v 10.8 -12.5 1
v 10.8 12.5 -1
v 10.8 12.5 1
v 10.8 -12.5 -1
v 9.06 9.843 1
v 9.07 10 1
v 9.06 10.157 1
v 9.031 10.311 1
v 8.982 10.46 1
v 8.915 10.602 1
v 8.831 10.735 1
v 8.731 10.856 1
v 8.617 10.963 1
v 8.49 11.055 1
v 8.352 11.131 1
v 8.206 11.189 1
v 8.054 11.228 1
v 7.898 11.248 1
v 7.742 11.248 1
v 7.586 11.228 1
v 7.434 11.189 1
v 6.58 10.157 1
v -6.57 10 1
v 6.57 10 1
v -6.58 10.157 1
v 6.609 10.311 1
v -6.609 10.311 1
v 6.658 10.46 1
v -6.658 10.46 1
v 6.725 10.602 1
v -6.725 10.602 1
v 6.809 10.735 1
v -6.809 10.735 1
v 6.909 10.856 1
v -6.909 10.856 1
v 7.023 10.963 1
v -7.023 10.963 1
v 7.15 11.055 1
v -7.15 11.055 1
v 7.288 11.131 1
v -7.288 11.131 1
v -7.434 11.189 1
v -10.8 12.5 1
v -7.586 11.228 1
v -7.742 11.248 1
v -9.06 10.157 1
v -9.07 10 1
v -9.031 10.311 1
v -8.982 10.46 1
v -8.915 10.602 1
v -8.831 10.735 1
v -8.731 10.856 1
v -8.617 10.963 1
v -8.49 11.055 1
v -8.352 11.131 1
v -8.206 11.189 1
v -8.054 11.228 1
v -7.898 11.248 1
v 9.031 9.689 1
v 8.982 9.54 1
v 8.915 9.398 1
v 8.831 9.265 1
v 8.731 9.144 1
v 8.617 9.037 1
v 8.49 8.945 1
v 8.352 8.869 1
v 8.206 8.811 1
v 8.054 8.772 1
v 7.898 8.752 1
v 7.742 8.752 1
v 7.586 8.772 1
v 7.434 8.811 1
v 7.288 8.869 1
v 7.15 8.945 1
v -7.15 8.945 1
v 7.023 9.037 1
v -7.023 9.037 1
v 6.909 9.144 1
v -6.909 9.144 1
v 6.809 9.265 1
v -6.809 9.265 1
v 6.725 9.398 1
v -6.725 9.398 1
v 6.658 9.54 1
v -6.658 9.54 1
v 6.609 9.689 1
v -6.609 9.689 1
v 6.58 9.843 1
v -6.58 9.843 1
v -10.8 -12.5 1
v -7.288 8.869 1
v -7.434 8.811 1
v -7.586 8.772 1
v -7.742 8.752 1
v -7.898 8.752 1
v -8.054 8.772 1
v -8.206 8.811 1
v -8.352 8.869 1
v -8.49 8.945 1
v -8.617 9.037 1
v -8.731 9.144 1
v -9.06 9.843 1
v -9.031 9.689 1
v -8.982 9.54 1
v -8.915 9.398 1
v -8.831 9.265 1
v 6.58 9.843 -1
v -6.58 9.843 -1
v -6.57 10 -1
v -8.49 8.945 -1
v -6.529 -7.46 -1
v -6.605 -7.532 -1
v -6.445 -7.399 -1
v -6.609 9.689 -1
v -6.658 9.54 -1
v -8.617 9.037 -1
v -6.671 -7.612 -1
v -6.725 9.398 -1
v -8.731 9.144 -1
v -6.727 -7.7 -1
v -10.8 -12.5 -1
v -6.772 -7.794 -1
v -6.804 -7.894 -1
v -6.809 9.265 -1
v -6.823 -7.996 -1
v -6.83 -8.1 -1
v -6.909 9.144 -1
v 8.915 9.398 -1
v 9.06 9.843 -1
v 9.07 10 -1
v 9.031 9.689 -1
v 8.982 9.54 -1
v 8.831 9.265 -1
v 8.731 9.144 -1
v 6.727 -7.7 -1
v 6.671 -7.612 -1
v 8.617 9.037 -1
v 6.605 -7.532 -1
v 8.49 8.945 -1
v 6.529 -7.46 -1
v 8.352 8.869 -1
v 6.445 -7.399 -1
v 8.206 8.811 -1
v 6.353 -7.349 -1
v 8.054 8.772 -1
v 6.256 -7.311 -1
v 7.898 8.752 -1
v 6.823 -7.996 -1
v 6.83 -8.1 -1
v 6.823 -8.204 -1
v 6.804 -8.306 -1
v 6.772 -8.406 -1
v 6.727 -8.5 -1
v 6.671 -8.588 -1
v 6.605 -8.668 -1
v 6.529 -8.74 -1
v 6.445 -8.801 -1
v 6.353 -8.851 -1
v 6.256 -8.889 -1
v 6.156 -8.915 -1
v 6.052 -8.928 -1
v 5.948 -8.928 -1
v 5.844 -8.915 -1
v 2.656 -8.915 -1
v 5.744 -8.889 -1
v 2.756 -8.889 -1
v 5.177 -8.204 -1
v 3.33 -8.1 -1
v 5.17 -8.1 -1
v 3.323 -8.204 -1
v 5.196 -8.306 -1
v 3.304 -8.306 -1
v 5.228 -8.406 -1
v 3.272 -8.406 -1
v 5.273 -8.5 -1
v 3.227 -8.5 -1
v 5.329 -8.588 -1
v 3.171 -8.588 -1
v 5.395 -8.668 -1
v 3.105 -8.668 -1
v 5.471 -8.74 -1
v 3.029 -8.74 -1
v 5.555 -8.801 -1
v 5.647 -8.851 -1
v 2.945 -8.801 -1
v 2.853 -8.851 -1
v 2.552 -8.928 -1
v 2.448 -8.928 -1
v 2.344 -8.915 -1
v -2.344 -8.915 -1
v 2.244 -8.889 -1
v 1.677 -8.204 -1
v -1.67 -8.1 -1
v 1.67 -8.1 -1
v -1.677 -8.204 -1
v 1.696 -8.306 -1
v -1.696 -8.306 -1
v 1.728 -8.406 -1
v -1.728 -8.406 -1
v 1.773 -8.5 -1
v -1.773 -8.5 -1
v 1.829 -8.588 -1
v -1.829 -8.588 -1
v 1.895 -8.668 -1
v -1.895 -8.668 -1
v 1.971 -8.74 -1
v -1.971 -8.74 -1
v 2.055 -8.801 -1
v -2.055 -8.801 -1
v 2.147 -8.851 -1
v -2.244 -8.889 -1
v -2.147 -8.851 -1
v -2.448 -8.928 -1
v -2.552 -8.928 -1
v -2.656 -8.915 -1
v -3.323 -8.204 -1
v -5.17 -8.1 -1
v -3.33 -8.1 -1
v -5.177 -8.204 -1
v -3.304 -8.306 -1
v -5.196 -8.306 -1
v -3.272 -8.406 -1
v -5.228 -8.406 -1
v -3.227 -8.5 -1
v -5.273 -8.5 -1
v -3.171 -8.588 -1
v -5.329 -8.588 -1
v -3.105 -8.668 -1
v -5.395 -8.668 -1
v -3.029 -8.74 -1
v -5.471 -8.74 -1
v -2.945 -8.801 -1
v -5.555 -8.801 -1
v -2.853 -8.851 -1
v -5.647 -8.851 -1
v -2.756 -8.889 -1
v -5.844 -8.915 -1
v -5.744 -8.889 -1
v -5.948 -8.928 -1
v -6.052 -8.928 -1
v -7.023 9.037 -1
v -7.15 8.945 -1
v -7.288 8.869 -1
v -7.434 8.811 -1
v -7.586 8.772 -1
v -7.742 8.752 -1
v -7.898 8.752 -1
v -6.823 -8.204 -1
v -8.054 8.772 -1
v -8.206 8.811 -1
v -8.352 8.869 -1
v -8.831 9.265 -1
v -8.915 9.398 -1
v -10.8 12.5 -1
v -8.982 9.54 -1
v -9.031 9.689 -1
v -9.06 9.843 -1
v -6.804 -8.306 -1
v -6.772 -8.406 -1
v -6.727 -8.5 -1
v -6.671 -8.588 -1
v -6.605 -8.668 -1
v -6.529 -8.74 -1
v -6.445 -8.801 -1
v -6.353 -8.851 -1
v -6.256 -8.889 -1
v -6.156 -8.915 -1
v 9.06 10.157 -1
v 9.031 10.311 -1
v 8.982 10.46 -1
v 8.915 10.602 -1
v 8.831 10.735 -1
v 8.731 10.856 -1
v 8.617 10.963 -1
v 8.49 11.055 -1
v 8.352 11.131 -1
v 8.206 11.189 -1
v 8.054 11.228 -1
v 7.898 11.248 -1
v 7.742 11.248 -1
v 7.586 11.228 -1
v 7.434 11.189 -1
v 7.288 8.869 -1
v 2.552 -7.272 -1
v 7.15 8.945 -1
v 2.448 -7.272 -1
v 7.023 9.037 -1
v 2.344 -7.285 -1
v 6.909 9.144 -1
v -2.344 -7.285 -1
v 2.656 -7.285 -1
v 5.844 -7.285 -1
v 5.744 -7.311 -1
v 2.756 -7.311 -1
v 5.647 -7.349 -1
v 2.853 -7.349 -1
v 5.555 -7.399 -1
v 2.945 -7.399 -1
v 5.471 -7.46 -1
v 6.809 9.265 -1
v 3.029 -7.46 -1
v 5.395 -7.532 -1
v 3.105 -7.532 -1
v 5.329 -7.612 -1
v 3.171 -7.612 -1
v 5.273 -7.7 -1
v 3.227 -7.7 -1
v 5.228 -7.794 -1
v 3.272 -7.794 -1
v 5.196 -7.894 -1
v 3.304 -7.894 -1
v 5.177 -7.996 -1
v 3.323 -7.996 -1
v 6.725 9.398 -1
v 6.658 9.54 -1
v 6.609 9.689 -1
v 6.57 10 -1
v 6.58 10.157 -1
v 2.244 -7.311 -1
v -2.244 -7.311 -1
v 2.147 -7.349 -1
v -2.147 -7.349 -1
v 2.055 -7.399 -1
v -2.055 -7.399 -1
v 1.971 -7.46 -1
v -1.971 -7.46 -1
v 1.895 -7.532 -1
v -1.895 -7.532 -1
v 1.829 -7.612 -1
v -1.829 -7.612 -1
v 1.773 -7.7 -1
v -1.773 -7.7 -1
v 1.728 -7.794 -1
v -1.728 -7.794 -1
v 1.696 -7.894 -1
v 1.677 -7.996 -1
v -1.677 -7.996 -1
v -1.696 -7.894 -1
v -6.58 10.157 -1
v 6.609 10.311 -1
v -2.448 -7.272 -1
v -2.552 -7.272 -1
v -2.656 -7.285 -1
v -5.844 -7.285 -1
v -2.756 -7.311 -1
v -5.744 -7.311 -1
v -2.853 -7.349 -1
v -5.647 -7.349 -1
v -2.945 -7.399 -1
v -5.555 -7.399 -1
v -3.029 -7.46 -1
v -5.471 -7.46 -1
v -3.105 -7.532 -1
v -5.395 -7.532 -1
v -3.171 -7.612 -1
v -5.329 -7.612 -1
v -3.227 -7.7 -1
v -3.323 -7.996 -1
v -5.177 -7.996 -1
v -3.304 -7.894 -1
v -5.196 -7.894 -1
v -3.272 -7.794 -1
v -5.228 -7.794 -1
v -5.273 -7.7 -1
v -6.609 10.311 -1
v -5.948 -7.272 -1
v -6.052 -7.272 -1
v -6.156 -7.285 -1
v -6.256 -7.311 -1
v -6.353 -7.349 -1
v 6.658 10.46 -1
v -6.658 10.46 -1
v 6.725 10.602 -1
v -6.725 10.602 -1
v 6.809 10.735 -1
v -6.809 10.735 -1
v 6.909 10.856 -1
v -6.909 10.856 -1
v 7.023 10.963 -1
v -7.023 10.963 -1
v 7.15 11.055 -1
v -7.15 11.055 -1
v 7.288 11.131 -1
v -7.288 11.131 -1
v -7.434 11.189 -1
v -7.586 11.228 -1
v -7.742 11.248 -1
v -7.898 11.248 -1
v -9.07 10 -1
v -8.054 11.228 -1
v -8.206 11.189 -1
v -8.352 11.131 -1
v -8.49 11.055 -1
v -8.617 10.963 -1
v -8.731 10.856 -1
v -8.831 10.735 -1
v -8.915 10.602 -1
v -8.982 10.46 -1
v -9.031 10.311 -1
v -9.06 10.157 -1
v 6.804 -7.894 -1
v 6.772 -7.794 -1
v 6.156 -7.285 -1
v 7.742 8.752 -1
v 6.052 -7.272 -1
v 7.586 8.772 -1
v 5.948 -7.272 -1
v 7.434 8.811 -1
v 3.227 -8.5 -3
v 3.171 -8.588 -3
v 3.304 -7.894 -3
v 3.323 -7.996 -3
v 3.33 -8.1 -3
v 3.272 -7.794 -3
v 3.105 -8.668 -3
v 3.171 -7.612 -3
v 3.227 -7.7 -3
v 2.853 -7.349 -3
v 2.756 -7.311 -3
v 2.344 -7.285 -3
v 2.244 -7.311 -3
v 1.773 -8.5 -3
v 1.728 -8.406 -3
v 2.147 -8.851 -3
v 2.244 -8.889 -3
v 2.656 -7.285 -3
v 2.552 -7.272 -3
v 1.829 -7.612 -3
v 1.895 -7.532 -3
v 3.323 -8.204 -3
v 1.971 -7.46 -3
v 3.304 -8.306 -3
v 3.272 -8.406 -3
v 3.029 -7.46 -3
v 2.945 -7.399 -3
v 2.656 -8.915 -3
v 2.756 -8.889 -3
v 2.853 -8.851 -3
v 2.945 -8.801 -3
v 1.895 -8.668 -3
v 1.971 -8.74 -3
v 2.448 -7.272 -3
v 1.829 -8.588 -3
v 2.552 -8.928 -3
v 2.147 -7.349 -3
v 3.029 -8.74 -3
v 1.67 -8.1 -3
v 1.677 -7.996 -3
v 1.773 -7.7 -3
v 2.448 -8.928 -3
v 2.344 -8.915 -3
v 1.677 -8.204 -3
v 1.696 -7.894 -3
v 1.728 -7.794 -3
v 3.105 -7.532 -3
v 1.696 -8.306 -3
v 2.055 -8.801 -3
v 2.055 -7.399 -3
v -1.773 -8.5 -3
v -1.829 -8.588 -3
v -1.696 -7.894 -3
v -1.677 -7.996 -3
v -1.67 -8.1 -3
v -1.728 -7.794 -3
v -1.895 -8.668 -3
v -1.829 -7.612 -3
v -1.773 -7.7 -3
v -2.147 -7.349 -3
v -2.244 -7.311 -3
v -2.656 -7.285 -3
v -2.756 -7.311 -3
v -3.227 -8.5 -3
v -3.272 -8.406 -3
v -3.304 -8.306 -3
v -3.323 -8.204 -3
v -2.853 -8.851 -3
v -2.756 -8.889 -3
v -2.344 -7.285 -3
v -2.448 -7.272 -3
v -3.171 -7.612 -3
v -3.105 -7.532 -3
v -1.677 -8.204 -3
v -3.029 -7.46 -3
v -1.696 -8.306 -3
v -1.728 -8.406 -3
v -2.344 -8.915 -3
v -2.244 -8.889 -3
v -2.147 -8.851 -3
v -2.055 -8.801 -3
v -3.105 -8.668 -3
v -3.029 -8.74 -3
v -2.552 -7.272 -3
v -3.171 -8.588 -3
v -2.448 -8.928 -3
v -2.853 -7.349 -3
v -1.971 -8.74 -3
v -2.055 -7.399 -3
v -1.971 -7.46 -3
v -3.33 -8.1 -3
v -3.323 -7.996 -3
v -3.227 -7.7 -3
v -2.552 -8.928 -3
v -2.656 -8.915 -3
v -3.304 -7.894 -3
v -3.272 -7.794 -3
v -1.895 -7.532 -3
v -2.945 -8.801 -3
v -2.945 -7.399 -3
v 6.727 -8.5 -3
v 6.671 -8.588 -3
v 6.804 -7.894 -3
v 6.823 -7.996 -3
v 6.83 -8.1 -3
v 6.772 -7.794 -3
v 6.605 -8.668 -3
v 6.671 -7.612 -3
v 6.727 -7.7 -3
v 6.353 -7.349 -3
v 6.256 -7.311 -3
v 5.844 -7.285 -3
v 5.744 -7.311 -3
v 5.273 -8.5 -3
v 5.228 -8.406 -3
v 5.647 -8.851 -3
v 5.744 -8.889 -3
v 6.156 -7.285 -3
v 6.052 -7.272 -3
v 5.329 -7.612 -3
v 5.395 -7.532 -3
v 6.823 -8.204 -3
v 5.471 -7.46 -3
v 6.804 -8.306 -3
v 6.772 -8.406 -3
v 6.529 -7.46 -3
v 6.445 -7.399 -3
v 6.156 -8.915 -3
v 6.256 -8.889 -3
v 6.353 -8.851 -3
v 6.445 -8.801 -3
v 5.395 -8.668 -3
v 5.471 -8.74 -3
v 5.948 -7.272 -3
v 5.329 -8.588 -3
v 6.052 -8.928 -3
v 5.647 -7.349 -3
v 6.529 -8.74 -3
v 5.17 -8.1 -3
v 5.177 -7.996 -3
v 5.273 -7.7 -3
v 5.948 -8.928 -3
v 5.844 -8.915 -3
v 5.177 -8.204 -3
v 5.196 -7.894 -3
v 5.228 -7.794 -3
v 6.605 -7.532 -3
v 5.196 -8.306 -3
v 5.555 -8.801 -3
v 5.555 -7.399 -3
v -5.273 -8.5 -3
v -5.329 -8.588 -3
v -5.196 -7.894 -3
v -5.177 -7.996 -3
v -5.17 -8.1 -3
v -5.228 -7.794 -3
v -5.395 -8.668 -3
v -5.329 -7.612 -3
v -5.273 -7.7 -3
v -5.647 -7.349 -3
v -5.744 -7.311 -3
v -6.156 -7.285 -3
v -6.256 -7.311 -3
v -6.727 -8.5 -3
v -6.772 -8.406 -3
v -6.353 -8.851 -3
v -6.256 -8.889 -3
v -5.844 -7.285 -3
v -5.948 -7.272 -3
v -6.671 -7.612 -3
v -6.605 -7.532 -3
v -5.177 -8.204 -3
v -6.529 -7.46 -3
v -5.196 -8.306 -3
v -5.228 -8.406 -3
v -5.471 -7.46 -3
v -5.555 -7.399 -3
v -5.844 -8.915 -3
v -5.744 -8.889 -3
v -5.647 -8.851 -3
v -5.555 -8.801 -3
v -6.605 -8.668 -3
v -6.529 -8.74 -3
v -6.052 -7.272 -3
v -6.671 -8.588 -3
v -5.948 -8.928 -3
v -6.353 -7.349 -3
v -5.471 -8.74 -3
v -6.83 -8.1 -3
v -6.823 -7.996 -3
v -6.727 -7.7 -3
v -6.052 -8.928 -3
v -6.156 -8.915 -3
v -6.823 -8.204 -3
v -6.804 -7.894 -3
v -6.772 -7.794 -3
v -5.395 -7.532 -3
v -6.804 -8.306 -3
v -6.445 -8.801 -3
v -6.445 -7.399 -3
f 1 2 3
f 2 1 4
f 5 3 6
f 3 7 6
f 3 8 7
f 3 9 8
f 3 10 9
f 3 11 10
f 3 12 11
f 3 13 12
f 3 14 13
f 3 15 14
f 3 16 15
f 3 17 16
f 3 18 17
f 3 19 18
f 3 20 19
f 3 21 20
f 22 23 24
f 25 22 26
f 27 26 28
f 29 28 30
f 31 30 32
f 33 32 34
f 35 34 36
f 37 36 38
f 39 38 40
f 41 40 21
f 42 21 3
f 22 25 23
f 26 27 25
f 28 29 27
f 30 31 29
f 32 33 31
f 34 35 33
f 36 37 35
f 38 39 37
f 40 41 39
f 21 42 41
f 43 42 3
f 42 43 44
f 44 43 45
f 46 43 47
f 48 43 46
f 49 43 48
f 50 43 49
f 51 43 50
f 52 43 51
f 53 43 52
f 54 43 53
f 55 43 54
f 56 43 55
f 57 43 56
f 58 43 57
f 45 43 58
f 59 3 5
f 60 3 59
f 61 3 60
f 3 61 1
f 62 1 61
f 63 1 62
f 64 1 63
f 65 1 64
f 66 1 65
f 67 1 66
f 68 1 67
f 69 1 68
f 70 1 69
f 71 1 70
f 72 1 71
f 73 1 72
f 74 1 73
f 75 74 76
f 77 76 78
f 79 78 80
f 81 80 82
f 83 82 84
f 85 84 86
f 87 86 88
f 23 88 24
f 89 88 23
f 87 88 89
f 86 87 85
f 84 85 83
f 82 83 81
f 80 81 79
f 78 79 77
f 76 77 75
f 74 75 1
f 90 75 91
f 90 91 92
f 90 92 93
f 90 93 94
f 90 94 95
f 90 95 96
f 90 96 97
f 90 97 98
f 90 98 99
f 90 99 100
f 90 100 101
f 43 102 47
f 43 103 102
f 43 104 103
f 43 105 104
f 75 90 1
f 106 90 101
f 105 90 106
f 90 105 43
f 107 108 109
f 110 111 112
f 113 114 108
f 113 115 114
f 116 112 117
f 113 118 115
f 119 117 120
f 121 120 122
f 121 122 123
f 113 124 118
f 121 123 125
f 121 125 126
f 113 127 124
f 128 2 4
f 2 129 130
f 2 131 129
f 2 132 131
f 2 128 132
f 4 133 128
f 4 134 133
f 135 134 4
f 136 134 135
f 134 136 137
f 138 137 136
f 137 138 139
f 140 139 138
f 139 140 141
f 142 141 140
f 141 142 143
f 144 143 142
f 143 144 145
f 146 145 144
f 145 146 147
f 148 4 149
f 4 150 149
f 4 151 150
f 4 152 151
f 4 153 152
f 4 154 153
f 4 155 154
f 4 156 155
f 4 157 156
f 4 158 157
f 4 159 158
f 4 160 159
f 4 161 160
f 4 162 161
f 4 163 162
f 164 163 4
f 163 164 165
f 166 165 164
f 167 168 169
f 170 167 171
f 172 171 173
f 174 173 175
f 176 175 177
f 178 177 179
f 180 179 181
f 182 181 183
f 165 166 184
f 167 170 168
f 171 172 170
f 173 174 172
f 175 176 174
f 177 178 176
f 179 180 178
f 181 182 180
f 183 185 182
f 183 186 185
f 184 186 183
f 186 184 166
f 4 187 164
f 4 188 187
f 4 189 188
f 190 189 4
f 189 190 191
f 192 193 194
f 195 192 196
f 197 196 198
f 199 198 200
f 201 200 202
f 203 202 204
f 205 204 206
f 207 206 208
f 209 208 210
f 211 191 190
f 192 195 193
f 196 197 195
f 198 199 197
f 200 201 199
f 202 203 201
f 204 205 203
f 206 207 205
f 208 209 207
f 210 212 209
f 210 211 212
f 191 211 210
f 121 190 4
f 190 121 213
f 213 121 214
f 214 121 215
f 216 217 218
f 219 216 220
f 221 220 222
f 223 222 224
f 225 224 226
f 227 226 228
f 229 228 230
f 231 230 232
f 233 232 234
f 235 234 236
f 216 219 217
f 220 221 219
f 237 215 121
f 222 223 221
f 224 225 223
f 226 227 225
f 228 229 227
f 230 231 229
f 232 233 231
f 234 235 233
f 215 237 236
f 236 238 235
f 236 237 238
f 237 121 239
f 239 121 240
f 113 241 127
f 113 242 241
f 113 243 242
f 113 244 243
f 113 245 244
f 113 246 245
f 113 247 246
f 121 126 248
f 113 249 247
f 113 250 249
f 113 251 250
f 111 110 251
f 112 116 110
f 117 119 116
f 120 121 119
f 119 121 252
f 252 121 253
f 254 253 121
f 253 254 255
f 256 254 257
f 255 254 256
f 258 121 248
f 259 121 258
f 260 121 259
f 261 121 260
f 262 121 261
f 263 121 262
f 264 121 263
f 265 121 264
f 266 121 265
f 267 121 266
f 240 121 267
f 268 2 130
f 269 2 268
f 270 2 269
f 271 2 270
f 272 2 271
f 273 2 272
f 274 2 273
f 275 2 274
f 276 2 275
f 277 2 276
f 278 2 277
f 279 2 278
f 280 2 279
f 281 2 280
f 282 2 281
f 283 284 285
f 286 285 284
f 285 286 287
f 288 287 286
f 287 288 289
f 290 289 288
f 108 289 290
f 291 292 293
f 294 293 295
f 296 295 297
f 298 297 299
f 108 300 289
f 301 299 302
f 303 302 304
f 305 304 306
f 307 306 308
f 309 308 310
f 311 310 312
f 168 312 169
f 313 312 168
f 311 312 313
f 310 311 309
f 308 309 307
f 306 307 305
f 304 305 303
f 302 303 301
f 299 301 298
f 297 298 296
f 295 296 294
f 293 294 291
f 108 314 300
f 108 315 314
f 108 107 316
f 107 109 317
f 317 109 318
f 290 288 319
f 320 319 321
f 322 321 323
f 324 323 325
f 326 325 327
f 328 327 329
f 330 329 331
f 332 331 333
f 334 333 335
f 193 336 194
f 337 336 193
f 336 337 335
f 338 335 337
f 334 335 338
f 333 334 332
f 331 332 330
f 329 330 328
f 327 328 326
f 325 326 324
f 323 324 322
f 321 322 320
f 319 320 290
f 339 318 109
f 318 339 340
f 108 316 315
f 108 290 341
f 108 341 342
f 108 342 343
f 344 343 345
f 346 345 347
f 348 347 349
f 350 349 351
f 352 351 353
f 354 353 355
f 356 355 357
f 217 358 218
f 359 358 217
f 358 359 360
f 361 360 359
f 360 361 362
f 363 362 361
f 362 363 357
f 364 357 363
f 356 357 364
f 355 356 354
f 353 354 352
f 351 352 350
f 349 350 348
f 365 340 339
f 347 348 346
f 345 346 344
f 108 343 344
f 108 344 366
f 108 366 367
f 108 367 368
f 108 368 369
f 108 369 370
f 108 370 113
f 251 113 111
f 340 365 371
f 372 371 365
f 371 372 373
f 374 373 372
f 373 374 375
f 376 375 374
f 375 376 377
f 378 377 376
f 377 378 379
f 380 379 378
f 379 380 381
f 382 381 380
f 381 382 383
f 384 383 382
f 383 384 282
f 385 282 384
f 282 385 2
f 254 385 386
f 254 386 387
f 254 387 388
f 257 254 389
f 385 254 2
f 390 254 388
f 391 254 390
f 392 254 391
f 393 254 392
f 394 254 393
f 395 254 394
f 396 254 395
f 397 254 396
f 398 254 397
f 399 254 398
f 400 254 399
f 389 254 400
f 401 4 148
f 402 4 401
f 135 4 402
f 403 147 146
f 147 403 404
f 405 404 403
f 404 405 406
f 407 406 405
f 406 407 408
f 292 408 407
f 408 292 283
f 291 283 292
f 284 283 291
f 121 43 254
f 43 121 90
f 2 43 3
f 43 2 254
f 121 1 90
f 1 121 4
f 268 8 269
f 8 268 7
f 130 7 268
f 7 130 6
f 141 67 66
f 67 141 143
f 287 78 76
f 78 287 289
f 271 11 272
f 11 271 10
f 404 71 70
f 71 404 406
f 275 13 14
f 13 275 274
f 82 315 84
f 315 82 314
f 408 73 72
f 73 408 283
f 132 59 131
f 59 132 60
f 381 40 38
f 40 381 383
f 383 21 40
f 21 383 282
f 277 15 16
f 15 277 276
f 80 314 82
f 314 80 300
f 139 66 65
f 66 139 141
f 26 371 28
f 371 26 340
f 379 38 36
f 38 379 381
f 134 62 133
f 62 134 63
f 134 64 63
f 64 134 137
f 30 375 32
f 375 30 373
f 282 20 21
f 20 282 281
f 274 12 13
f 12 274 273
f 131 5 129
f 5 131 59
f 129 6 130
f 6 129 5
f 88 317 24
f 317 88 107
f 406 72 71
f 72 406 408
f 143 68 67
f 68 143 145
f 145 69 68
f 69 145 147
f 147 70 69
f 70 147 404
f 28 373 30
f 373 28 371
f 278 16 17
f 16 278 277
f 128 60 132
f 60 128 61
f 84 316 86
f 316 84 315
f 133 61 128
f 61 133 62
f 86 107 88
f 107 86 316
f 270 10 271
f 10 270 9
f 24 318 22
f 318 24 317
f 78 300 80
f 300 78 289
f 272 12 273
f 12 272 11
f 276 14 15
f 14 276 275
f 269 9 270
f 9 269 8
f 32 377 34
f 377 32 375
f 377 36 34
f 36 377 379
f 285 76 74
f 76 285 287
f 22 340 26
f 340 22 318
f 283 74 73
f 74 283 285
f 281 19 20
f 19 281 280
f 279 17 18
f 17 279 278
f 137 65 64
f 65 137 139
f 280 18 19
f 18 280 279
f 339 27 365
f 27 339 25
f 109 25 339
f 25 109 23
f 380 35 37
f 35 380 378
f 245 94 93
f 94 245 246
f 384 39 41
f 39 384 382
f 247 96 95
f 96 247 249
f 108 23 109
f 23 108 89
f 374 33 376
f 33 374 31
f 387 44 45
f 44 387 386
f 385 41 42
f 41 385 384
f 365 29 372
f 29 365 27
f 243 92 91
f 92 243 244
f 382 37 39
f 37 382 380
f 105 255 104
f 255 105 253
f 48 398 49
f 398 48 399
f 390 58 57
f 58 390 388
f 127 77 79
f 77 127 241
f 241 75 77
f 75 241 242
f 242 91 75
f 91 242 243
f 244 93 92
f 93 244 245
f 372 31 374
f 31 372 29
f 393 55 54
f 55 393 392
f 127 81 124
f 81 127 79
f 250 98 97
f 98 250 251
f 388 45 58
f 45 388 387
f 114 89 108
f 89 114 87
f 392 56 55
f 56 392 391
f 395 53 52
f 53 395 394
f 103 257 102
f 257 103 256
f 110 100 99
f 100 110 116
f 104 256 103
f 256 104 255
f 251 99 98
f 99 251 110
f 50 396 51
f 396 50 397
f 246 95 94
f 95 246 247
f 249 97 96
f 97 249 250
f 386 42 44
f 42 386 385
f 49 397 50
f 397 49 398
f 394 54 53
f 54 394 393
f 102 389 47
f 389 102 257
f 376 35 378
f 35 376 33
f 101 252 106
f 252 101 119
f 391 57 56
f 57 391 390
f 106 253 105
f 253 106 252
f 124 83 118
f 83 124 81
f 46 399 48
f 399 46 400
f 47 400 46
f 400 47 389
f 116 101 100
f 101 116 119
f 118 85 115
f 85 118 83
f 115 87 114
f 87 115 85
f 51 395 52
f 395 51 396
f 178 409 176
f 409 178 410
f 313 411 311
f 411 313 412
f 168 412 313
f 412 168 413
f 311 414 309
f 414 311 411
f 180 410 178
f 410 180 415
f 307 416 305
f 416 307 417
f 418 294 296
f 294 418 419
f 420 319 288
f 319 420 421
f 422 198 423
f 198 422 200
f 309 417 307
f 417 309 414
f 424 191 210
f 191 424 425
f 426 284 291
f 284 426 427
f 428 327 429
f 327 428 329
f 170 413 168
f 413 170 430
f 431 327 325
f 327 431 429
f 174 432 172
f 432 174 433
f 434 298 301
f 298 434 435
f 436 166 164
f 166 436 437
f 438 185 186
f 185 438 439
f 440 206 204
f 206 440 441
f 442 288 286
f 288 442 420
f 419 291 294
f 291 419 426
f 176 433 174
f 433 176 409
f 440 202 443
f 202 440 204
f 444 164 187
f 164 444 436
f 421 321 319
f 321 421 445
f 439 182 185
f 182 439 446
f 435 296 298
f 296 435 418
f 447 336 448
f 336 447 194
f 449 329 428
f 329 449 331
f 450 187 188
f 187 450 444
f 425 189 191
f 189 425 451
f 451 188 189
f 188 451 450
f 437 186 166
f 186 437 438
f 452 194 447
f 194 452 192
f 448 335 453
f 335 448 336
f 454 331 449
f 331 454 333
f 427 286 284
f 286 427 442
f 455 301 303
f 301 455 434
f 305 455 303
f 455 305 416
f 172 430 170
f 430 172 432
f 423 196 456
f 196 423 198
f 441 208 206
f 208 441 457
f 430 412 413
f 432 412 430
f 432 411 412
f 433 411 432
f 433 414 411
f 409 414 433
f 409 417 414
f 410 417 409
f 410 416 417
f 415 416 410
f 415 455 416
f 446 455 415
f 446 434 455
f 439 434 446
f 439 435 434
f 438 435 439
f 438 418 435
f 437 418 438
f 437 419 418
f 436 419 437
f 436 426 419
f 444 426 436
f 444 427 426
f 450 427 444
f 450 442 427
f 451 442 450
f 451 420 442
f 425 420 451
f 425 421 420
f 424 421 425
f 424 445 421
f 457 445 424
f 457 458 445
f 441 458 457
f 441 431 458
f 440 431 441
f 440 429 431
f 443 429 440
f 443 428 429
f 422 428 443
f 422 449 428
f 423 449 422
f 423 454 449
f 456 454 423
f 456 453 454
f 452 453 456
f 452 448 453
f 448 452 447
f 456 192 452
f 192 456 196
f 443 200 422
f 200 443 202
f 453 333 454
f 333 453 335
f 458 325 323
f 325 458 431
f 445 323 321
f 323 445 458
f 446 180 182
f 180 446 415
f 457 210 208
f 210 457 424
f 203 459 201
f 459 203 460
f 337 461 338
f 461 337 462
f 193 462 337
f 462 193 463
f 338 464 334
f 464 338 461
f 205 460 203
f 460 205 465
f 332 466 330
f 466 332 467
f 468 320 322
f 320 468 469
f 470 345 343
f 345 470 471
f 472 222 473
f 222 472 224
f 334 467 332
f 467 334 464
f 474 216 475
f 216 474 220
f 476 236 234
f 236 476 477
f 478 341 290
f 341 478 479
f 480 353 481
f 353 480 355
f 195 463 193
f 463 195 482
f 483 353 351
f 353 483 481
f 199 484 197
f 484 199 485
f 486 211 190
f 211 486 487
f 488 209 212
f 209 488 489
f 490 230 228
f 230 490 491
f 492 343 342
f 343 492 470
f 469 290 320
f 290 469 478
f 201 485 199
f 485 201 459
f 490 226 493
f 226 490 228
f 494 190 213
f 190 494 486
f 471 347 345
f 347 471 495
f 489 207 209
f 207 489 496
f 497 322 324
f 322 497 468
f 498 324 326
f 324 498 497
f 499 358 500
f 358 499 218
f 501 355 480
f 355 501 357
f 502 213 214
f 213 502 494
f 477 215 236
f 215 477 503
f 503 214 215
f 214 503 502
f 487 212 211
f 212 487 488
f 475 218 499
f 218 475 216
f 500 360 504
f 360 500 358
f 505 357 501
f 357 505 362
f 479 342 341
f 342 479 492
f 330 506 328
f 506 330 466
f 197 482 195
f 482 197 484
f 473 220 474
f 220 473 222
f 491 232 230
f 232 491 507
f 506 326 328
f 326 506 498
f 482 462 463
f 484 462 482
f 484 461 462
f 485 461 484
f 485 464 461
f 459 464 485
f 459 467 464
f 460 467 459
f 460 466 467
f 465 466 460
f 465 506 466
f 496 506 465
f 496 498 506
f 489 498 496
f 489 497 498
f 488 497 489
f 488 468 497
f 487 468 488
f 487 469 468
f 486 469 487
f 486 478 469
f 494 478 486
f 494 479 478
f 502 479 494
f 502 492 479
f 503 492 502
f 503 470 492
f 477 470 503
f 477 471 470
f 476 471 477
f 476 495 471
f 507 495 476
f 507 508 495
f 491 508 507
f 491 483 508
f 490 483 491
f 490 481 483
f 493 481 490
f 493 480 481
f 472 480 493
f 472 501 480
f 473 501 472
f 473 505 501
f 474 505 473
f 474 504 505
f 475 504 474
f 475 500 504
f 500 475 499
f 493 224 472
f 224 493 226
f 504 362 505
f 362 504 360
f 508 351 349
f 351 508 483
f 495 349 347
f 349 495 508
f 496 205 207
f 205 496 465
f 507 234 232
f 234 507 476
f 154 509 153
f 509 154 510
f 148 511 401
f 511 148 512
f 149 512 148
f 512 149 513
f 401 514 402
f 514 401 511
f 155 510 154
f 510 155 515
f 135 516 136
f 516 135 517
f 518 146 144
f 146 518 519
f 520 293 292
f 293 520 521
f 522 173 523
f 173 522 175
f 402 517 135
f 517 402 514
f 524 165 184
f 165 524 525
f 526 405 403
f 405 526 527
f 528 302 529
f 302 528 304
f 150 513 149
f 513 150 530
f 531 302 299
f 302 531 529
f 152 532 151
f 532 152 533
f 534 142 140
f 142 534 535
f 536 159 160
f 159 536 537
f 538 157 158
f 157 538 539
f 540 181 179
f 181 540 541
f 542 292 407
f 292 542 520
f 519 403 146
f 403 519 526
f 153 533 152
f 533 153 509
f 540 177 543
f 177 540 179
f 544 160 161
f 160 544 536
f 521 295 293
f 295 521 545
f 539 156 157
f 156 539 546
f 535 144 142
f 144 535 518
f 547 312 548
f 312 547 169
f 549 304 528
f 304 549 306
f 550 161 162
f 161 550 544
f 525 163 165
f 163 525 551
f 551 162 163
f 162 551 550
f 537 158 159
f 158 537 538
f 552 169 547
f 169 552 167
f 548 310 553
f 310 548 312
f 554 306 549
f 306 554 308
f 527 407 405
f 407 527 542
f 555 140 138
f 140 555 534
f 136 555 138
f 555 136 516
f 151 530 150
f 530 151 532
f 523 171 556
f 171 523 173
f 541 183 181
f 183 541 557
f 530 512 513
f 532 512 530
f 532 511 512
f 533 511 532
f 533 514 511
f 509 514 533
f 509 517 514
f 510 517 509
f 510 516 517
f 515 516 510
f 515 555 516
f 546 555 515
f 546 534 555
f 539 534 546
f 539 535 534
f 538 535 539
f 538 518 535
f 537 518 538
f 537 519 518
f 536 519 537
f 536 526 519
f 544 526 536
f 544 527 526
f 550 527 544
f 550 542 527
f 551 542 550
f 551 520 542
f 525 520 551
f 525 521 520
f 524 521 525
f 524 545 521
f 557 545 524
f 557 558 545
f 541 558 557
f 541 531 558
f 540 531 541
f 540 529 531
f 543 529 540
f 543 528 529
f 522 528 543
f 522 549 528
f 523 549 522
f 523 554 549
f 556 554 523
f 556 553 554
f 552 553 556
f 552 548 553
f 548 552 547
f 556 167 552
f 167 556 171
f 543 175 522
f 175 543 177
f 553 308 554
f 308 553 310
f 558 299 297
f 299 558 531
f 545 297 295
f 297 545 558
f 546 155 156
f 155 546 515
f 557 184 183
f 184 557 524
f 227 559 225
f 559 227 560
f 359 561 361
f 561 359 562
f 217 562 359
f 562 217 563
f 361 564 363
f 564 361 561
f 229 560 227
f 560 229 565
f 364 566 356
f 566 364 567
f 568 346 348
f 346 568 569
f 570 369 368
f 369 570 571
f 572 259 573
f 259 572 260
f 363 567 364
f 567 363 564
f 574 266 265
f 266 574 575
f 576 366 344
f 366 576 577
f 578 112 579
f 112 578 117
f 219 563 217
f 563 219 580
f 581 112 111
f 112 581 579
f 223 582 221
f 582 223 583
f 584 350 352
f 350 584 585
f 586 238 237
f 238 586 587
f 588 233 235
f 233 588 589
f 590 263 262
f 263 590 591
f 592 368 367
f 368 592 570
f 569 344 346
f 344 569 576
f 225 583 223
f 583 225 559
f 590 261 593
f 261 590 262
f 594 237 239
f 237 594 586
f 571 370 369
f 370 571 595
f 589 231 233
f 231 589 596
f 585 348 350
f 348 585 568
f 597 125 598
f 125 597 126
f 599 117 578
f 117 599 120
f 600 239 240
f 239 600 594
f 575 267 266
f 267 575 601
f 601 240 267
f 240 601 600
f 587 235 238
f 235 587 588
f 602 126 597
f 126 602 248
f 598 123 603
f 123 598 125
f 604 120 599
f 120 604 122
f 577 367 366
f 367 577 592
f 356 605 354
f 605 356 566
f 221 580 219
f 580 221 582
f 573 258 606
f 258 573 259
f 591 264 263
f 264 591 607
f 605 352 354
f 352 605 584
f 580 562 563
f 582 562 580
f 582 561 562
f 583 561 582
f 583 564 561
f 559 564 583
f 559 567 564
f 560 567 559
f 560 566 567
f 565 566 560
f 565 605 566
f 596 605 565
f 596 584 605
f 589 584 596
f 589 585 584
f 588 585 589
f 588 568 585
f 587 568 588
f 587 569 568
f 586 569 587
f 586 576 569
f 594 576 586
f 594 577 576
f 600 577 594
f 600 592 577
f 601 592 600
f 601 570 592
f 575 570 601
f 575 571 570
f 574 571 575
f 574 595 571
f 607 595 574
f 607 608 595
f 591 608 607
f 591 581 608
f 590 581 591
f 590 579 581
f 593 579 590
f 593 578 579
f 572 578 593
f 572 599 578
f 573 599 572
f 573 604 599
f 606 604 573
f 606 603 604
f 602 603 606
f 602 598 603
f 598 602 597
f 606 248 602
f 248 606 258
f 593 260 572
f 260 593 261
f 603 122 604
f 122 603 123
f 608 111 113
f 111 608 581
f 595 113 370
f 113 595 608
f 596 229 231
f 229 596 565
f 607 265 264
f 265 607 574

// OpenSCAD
// file: ../robot_settings.scad
main_box_x = 95; // 96
main_box_y = 102;
main_box_z = 74; // 74.5
wall_thickness = 2;

rail_gap = 2;
rail_inset = 7;

rail_thickness = 7;
rail_length = 250;
rail_width = 200;

raspberry_pi_screw_seperation_y = 57;
raspberry_pi_screw_seperation_z = 48;
raspberry_pi_peg_h = 5;

battery_box_peg_h = 6;
battery_box_peg_d = 8;
battery_box_peg_cutout = 5;

gears_module = 1;
pinion_gear_teeth = 32;
pinion_gear_width = 5;
pinion_gear_bore = 8;

gears_setback_distance = 25;
gear_post_height = 2 * pinion_gear_width + rail_thickness + 8 ;

steering_motor_mount_x = 45;
steering_motor_mount_y = 36;
steering_motor_mount_z = 18;
steering_motor_mount_setback_distance = gears_setback_distance + 16;

dc_motor_drivertype = "Teyleten"; // Teyleten
isAdafruit = (dc_motor_drivertype == "Adafruit");

drv8871_x = isAdafruit ? 20.3 : 21.6;
drv8871_y = isAdafruit ?  24 : 25;

drv8871_z = 2;
drv8871_screw_d = 2.5;
drv8871_solder_points_z = 2;

drv8871mount_edge_x = 1.5;
drv8871mount_edge_wall = 3;
drv8871mount_z = 5;
drv8871mount_x = drv8871_x +  drv8871mount_edge_wall - 2* drv8871mount_edge_x;
drv8871mount_y = 19;

drv8871_screw_distance = 15.64;
drv8871_solder_points_d = 1.66;
drv8871_solder_offset_y = 4.4;
drv8871_solder_inner_points_distance = 5;
drv8871_solder_outer_points_distance = 12;

dc_motor_housing_minus_encoder_z = 48;
dc_motor_encoder_z = 9.33;
dc_motor_encoder_wheel_d = 13.4;
dc_motor_encoder_wheel_thickness = 5;
dc_motor_encoder_wheel_gap = 3;
dc_motor_encoder_circuit_thickness = 2;
dc_motor_cutout_d = 24.8;
dc_motor_cutout_z = 19.5;

dc_motor_screw_head_z = 2;
dc_motor_screw_head_d = 5.6;
dc_motor_screw_d = 3.2;
dc_motor_screw_offset = 8.5;

dc_motor_axle_ring_z = 3;
dc_motor_axle_ring_d = 7.2;
dc_motor_axle_cutout_d = 4.5;
dc_motor_axle_cutout_z = 10;
dc_motor_axle_notch_cutout = 0.4;
dc_motor_axle_notch_cutout_z = 6;

pdmount_x = 20;
pdmount_y = 30;
pdmount_z = 2;
pdmount_edge_x = 1.5;
pdmount_edge_wall = 3;

steering_shaft_z = 45;
steering_shaft_d = 7;
steering_shaft_motor_fitting_d = 9;
coupler_length = 24.6;
coupler_diameter = 14;
coupler_screw_d = 4;
coupler_screw_z_offset = 5;
coupler_gear_side_insert = 12.6;
steering_shaft_with_coupler_z = steering_shaft_z - coupler_gear_side_insert;

lidar_mount_y = 110;
lidar_mount_x = 65 + 20;
lidar_narrow_screws = 40;
lidar_wide_screws = 56;
lidar_front_to_back_screws = 70;
lidar_screw_d = 3;
lidar_circuitboard_x = 20;
lidar_circuitboard_y = 35;
lidar_circuitboard_z = 1.2;
lidar_cord_length = 29;

ball_bearing_height = 7;
ball_bearing_outer_diameter = 22;
ball_bearing_inner_diameter = 8;

 armature_holder_height = 20;
 armature_holder_thickness = 8;
pull_bar_peg_r = 3.2;
apparatus_locking_peg_d = 4;

rack_module = 1;
rack_length = main_box_x / 2;
rack_height = 10;
rack_width = 10;
rack_teeth = 30;
rack_bore = 3;

pull_bar_length = rail_width / 2 - rack_length + 1;

// tire hardware
axle_length = 30;
axle_reciever_inner_diameter = 7.75;
axle_reciever_length = 18.8;
axle_notch_length = 7;
axle_notch_cutout = 2.4;

// power distribution bar
power_bar_cutout_x = 96;
power_bar_y = 19.1;
power_bar_z = 1.5;
power_bar_screw_distance = 91.4;
power_bar_screw_d = 2.8;
power_bar_standoff_z = 5;
power_bar_standoff_d = 6.83;

// breadboard
breadboard_wall_thickness = 3;
breadboard_width = 55;
breadboard_length = 83;
breadboard_height = 10.5;
breadboard_notch_width = 4.2;
breadboard_longside_notch_separation = 58.2 - breadboard_notch_width / 2;
breadboard_shortside_notch_separation = 26.3 - breadboard_notch_width;

pico_expander_width = 63;
pico_expander_height = 57;
pico_screw_hole_offset = 3;
pico_screw_hole_d = 2.5;

usbhub_thickness = 11.7;
usbhub_depth = 37.5;
usbhub_width = 86.7;
usbhub_end_port_width = 14.8;
usbhub_end_port_height = 12;
usbhub_front_face_safe_zone_left = 15;
usbhub_front_face_safe_zone_right = 14.8;

switch_w = 16;
switch_cutout_d = 12.2;
switch_bump_h = 2;
switch_bump_l = 18.2;
// main file
include <../robot_settings.scad>
$fn = 50;

module drv8871() {
  difference() {
    cube([drv8871_x, drv8871_y, drv8871_z], center = true);
    
    translate([drv8871_screw_distance / 2, drv8871_y / 2 - drv8871_screw_d, 0])
    cylinder(h = 2 * drv8871_z, d = drv8871_screw_d, center = true);
    
    translate([-drv8871_screw_distance / 2, drv8871_y / 2 - drv8871_screw_d, 0])
    cylinder(h = 2 * drv8871_z, d = drv8871_screw_d, center = true);
    }
    
    translate([drv8871_solder_inner_points_distance / 2, -drv8871_y / 2 + drv8871_solder_offset_y, -drv8871_z])
    cylinder(h = drv8871_solder_points_z, d = drv8871_solder_points_d, center = true);
    
    translate([-drv8871_solder_inner_points_distance / 2, -drv8871_y / 2 + drv8871_solder_offset_y, -drv8871_z])
    cylinder(h = drv8871_solder_points_z, d = drv8871_solder_points_d, center = true);
    
    translate([drv8871_solder_outer_points_distance / 2, -drv8871_y / 2 + drv8871_solder_offset_y, -drv8871_z])
    cylinder(h = drv8871_solder_points_z, d = drv8871_solder_points_d, center = true);
    
    translate([-drv8871_solder_outer_points_distance / 2, -drv8871_y / 2 + drv8871_solder_offset_y, -drv8871_z])
    cylinder(h = drv8871_solder_points_z, d = drv8871_solder_points_d, center = true);
}

drv8871();
